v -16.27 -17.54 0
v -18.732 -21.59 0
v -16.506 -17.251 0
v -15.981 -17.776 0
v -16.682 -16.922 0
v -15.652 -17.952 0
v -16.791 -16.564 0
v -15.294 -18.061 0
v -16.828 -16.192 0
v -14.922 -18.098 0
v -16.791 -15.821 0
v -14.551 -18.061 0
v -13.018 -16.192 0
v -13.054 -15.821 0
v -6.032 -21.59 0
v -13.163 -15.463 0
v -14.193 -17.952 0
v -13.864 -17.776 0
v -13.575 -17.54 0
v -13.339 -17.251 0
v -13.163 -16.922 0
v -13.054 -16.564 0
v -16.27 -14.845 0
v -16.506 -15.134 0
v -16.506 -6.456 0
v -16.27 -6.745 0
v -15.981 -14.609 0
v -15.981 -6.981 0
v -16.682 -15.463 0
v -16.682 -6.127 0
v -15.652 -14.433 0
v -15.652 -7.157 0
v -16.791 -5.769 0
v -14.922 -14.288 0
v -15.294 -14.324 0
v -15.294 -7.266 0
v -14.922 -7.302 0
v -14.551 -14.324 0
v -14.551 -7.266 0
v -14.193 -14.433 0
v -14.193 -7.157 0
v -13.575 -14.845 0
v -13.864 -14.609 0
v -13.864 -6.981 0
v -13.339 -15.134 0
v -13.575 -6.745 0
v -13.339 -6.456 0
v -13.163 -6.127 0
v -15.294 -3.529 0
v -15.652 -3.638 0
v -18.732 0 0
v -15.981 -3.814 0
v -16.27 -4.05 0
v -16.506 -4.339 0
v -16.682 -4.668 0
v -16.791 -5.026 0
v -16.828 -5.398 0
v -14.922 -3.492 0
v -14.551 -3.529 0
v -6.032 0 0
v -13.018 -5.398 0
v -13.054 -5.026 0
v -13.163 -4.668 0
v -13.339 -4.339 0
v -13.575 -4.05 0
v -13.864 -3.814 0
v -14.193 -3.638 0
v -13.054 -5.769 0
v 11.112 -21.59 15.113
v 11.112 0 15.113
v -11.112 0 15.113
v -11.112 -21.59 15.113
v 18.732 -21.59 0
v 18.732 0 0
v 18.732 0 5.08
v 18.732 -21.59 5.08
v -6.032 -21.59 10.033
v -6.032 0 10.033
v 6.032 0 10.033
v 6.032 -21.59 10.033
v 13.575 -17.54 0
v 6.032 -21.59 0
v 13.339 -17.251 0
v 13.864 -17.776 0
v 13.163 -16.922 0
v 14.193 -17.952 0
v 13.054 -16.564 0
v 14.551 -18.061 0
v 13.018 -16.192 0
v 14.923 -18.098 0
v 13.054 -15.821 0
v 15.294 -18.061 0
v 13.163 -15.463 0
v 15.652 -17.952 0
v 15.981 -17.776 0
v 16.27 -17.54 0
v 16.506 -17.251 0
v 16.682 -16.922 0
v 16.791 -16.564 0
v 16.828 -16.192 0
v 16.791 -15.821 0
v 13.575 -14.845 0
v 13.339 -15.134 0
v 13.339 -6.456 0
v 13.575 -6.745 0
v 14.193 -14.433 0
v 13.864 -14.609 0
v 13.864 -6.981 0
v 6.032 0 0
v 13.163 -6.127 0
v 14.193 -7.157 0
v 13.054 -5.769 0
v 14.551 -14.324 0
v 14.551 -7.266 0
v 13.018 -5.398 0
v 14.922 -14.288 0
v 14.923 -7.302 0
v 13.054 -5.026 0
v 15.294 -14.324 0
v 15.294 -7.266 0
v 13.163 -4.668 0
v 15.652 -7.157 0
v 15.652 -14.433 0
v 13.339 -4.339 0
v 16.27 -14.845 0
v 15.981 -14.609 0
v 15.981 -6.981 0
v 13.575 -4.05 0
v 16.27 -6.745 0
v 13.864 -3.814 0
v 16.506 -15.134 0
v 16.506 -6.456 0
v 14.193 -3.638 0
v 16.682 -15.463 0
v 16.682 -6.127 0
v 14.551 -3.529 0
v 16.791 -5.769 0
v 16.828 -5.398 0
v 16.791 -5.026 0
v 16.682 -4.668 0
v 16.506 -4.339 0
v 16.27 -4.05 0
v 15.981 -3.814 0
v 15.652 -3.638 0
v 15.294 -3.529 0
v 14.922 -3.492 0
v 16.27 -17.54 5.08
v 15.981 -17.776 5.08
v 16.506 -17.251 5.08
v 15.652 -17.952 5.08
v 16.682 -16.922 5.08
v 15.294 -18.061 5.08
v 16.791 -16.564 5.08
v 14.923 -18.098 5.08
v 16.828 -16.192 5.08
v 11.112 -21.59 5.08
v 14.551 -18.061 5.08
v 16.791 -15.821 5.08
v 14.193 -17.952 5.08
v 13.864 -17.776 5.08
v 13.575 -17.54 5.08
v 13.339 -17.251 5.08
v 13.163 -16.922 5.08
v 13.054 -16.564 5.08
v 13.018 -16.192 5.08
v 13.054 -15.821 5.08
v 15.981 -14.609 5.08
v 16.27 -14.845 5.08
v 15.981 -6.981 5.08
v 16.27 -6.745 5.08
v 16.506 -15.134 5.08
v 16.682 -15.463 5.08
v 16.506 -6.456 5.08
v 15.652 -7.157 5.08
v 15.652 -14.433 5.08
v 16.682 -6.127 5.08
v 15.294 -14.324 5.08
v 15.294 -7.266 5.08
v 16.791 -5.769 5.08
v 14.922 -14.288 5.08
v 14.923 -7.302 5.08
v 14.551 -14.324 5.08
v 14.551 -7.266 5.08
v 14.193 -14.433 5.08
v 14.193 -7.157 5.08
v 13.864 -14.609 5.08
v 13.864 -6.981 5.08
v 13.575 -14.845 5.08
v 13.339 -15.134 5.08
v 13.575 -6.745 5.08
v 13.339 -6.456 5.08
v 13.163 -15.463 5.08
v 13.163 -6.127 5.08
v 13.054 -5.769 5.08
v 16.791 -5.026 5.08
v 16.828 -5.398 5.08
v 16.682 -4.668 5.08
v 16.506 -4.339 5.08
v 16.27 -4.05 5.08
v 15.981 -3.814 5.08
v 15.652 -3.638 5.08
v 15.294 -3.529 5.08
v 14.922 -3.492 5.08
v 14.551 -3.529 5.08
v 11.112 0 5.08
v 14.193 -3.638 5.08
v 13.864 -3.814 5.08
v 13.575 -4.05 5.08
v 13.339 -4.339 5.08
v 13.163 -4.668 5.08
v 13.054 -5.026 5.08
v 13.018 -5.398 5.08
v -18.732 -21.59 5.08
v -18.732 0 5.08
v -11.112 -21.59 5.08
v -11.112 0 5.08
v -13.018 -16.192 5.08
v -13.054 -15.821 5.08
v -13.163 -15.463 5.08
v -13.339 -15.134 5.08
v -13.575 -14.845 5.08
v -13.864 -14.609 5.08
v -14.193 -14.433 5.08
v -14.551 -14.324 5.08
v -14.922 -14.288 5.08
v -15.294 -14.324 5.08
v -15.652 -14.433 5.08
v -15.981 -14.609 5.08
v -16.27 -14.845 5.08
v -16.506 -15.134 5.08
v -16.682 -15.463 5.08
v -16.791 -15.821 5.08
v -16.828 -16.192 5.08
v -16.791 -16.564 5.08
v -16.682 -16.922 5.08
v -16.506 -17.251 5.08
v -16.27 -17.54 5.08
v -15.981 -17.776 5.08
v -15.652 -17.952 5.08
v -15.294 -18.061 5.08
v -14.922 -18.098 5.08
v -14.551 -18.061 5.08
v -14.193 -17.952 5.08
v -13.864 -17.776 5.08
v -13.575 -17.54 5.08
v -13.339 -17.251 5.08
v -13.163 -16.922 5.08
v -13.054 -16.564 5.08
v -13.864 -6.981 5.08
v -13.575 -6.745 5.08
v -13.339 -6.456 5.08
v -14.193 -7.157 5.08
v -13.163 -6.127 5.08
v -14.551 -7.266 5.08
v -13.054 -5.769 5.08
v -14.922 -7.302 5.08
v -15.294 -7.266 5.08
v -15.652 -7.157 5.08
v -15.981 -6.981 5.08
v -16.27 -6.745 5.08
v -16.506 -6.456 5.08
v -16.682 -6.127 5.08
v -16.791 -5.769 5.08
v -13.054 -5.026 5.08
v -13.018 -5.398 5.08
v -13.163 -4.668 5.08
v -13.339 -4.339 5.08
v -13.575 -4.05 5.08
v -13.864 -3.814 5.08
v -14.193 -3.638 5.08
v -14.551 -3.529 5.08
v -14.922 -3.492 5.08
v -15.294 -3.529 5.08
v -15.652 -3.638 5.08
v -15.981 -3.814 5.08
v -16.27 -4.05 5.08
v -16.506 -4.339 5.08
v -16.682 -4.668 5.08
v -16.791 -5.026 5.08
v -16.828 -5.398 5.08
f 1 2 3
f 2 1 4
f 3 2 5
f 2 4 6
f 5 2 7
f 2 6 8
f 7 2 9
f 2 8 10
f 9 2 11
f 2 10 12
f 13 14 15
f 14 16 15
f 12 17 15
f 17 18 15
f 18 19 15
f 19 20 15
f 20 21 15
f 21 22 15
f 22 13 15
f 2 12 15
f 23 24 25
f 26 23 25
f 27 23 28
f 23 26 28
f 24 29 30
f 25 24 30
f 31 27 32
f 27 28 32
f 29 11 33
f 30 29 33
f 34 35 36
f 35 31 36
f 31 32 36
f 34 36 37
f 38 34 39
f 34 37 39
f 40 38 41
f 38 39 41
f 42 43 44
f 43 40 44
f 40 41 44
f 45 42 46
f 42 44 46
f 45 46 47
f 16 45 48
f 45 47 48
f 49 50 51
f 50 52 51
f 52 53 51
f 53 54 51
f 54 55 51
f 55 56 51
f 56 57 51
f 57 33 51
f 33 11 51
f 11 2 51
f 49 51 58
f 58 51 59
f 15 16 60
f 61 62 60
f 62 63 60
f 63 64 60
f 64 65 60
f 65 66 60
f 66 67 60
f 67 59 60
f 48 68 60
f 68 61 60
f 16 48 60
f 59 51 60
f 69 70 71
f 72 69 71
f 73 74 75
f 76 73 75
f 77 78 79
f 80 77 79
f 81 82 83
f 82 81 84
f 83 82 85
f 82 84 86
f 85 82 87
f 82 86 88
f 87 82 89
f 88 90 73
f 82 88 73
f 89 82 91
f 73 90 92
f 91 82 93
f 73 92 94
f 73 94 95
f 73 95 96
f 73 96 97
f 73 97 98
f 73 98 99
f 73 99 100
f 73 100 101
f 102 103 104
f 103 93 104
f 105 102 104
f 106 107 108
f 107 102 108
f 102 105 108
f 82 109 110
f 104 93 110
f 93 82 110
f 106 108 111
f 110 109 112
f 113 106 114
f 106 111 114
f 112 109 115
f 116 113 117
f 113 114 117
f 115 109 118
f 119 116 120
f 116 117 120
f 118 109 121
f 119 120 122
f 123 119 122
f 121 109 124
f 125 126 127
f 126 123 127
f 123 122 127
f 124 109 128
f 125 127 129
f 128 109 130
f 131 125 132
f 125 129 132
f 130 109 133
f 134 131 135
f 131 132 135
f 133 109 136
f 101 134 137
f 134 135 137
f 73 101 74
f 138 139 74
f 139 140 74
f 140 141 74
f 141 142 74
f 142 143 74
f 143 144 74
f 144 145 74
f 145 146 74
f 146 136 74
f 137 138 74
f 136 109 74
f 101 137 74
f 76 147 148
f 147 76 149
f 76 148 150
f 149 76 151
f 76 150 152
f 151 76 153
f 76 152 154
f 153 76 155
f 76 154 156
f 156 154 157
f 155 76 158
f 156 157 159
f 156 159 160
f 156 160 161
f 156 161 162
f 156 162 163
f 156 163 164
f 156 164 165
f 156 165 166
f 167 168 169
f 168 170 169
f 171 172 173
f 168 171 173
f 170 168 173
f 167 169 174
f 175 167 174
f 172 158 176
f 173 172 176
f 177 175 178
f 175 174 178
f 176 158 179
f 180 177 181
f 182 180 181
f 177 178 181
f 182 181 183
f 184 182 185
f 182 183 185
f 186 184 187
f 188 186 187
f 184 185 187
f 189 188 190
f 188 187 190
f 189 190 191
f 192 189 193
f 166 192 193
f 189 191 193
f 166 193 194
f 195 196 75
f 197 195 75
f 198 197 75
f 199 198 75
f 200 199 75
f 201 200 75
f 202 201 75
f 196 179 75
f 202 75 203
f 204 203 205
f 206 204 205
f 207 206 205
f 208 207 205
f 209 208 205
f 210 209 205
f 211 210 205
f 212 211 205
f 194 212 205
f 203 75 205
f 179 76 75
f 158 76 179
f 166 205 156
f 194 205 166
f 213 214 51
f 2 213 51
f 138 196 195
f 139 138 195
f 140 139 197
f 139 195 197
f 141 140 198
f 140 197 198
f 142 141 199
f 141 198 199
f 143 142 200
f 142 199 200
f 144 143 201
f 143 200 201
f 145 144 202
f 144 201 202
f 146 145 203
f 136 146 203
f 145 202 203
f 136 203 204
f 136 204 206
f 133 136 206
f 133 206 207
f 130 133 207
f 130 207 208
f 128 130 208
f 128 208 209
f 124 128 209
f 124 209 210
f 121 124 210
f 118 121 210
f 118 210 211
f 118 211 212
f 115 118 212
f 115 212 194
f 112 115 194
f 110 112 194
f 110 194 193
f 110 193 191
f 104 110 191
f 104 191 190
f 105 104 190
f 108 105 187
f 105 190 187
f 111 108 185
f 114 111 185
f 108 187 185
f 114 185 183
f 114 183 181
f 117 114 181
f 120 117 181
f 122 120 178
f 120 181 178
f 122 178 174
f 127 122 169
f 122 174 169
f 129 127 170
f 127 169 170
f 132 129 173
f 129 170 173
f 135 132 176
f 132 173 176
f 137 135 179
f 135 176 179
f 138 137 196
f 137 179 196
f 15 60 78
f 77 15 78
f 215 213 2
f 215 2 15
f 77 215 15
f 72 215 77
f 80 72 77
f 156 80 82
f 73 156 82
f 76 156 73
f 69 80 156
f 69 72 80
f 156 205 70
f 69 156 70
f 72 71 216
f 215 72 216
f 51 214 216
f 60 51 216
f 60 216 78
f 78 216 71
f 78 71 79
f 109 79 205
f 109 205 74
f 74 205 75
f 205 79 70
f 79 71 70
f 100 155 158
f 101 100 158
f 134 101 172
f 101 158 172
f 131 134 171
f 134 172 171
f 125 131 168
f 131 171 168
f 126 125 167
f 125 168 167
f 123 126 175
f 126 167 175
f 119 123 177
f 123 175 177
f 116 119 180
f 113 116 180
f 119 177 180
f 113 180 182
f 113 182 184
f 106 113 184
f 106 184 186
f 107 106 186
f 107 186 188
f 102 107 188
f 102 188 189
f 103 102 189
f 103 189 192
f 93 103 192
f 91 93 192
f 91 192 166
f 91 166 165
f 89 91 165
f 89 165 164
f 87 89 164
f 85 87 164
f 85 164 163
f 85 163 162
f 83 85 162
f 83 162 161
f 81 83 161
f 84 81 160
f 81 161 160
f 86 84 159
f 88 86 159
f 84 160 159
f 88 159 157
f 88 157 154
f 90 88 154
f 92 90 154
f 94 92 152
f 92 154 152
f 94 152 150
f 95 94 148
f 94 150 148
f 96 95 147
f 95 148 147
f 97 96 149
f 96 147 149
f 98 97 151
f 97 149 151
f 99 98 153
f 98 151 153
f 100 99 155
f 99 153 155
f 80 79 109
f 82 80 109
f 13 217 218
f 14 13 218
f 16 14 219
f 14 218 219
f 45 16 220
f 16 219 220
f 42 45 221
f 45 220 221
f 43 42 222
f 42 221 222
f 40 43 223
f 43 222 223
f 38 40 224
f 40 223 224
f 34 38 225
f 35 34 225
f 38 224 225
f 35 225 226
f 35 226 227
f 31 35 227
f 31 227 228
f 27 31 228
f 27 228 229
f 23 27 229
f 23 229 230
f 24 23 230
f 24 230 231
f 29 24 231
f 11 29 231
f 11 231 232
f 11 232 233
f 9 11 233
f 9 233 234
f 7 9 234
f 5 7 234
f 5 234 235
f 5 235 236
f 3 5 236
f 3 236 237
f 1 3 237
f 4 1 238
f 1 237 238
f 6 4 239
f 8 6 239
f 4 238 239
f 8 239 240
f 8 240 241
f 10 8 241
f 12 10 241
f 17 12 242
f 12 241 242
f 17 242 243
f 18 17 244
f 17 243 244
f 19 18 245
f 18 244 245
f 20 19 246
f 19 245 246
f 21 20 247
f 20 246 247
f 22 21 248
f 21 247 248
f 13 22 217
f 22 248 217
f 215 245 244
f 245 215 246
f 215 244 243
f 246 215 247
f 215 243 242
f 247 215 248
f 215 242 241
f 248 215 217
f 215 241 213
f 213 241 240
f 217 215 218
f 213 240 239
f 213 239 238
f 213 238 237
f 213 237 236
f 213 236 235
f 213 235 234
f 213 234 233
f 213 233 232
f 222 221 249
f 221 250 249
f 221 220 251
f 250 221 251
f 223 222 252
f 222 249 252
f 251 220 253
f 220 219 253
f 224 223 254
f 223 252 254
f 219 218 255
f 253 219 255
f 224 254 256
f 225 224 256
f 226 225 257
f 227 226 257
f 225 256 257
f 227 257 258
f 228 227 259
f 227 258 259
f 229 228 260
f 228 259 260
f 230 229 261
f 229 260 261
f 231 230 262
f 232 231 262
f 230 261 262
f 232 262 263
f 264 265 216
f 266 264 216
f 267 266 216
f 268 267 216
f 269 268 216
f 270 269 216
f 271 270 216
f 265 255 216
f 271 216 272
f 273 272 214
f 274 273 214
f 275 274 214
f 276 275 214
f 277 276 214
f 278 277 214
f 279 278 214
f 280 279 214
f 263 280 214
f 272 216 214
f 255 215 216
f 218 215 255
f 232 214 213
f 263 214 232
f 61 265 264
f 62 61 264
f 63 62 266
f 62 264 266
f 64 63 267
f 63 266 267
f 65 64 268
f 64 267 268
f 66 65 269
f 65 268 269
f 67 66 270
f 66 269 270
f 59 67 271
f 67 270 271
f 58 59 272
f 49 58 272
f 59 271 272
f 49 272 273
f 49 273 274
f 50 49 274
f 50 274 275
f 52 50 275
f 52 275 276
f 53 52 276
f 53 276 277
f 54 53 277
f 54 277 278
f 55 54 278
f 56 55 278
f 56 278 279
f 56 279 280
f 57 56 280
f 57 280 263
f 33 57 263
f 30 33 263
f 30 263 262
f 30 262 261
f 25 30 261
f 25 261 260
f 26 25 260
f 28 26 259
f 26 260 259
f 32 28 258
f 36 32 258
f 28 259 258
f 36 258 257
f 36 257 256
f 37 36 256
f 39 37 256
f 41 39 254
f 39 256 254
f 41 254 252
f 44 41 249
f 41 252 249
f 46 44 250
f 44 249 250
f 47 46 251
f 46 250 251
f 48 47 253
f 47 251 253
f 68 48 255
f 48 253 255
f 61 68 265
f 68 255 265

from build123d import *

# Parameters (mm, degrees)
F1_DEPTH = 21.59
F2_R     = 1.905
F3_DEPTH = 5.081


with BuildPart() as f1:
    # F0 (on Front) → F1 (new body)
    with BuildSketch(Plane.XZ):
        Polygon((-18.7325, 5.08), (-18.7325, 0), (-6.0325, 0), (-6.0325, 10.033), (0, 10.033), (6.0325, 10.033), (6.0325, 0), (18.7325, 0), (18.7325, 5.08), (11.1125, 5.08), (11.1125, 15.113), (0, 15.113), (-11.1125, 15.113), (-11.1125, 5.08), align=None)
    extrude(amount=F1_DEPTH)

    # F2 (on face) → F3 (cut, through all)
    with BuildSketch(Plane.XY.offset(5.08)):
        with Locations((-14.9225, -5.3975)):
            Circle(F2_R)
        with Locations((-14.9225, -16.1925)):
            Circle(F2_R)
        with Locations((14.9225, -16.1925)):
            Circle(F2_R)
        with Locations((14.9225, -5.3975)):
            Circle(F2_R)
    extrude(amount=-F3_DEPTH, mode=Mode.SUBTRACT)


solid = f1.part
